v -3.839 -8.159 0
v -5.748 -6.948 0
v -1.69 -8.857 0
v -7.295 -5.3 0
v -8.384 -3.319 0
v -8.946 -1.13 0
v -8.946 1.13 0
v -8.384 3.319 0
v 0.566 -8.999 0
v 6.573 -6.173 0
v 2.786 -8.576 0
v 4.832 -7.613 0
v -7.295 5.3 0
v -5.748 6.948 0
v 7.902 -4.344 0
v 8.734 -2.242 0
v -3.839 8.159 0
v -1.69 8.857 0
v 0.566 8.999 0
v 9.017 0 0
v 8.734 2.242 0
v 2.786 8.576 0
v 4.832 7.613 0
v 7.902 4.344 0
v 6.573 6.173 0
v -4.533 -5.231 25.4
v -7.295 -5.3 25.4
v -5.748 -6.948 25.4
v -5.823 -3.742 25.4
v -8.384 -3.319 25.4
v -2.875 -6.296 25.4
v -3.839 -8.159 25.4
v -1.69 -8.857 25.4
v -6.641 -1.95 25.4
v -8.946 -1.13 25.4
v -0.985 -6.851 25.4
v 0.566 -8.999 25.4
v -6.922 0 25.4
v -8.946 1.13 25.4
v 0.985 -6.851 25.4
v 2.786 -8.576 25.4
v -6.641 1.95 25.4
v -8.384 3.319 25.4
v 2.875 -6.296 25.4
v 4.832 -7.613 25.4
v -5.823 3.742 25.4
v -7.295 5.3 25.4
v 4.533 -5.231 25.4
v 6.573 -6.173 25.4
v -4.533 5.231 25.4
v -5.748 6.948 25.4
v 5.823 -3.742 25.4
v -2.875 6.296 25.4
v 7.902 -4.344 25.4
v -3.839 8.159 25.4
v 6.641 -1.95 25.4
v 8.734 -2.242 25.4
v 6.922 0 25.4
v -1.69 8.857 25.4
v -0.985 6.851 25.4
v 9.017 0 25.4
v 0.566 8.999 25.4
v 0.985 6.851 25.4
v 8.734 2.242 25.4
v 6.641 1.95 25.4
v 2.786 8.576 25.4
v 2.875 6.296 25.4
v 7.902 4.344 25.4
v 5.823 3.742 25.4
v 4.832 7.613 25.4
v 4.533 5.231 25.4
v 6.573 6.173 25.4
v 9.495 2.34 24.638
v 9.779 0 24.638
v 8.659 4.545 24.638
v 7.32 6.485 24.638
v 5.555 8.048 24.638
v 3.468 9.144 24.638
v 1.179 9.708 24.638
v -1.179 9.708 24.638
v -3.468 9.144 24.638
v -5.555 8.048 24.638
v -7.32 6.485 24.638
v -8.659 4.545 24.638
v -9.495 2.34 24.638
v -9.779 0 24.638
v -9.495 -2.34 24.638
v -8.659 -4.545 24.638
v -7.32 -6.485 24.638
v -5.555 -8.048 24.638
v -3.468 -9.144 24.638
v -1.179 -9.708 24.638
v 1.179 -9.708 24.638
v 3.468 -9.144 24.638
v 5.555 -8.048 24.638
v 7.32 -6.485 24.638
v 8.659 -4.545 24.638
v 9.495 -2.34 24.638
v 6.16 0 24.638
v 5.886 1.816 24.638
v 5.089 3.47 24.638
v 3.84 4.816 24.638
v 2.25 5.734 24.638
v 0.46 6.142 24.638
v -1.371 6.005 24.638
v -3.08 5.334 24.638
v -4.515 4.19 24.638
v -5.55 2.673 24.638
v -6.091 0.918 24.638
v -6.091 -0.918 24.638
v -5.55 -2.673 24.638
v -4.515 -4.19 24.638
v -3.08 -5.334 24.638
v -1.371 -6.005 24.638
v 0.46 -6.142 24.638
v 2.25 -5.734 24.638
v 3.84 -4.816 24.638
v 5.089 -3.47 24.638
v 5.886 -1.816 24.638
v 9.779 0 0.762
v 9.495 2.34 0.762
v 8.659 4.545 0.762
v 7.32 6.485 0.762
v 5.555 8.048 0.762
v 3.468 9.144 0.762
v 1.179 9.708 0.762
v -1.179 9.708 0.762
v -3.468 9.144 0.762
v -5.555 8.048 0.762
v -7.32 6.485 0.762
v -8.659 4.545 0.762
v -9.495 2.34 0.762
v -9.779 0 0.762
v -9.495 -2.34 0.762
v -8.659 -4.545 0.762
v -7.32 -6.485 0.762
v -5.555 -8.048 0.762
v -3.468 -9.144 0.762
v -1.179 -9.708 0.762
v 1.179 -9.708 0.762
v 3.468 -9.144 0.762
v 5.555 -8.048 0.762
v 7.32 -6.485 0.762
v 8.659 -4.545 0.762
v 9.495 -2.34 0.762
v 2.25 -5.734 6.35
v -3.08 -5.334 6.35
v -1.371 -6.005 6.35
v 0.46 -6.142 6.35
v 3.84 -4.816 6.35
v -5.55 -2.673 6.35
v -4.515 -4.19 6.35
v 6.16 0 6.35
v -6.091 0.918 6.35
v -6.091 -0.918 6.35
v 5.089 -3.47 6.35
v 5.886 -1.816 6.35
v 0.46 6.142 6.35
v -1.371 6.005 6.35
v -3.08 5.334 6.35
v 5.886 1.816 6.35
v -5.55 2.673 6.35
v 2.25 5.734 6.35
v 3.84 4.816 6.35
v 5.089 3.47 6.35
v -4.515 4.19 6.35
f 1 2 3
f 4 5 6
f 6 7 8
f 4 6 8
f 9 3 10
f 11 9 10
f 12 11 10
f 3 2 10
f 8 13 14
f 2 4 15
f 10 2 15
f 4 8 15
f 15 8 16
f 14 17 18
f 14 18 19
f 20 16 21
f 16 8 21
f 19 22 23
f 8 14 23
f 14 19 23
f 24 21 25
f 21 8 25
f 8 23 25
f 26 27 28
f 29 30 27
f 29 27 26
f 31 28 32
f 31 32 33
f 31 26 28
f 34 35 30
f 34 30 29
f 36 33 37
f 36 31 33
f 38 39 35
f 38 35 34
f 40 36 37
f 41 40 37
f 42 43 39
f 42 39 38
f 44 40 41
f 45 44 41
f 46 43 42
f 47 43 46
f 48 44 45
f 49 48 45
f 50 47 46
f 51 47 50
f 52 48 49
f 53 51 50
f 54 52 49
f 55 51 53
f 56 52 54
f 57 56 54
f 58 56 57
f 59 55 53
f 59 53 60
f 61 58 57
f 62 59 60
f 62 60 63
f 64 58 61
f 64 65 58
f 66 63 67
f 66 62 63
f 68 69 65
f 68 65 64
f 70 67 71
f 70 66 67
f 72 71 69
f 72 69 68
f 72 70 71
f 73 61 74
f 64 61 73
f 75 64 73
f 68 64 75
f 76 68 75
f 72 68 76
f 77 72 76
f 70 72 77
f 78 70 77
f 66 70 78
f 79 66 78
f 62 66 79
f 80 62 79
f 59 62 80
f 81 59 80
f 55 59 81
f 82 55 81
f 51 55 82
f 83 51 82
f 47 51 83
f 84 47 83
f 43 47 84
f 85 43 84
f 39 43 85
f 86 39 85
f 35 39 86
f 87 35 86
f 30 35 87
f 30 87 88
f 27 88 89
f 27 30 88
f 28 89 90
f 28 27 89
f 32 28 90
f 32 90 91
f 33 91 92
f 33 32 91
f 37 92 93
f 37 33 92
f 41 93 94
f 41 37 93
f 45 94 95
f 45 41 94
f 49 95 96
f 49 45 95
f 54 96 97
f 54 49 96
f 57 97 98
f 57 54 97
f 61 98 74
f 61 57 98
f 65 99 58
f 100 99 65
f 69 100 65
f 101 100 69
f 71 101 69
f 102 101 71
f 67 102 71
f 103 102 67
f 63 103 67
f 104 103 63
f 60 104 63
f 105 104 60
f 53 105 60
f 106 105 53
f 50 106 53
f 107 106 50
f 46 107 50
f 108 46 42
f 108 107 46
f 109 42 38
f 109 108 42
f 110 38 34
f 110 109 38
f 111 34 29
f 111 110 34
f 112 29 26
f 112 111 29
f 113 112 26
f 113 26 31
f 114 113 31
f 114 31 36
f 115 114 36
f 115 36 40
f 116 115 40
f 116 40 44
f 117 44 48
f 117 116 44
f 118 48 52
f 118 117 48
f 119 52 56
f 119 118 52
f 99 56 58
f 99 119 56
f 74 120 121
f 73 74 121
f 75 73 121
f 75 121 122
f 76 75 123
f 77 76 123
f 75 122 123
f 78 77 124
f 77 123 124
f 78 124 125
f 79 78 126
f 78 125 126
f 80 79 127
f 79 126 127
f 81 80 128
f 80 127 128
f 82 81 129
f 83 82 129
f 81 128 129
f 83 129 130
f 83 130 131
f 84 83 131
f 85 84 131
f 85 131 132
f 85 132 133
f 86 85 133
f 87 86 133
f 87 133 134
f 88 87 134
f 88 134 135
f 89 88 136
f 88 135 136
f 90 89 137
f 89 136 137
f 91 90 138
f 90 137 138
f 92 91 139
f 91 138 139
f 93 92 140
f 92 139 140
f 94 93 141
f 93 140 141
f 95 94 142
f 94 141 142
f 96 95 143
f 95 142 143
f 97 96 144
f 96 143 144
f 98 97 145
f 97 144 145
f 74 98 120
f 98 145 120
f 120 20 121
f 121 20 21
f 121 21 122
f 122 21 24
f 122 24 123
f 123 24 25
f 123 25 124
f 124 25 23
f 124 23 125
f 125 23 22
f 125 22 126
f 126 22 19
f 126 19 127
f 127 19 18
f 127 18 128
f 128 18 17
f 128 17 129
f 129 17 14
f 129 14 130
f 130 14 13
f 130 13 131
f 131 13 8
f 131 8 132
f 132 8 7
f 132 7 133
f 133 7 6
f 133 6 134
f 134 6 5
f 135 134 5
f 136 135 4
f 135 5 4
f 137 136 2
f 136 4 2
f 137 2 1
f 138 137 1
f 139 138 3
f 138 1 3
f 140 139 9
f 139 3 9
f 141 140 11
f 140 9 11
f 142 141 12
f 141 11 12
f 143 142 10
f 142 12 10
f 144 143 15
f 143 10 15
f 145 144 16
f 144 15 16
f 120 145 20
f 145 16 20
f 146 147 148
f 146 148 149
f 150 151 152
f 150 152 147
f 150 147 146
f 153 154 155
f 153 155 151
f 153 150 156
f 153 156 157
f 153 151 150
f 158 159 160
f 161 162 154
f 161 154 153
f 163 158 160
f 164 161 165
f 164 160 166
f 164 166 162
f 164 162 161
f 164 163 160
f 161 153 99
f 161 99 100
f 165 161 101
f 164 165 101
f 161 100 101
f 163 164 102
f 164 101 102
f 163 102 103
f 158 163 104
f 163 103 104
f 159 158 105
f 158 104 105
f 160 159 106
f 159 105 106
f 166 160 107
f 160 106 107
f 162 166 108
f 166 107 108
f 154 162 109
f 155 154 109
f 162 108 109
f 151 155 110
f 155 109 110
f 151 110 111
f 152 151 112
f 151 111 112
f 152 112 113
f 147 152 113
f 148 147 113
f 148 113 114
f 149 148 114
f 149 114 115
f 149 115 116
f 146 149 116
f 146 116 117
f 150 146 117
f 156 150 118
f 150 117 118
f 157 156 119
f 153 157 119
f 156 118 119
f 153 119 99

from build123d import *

# Parameters (mm, degrees)
F0_R     = 9.779
F1_DEPTH = 25.4
F2_SIZE  = 0.762
F3_R     = 6.1595
F4_DEPTH = 19.05
F5_SIZE  = 0.762


with BuildPart() as f1:
    # F0 (on Top) → F1 (new body)
    with BuildSketch(Plane.XY):
        Circle(F0_R)
    extrude(amount=F1_DEPTH)

    # F2
    f2_edges = [f1.edges().sort_by_distance(p)[0] for p in [
        (-9.779, 0, 0),
    ]]
    chamfer(f2_edges, length=F2_SIZE)

    # F3 (on face) → F4 (cut)
    with BuildSketch(Plane.XY.offset(25.4)):
        Circle(F3_R)
    extrude(amount=-F4_DEPTH, mode=Mode.SUBTRACT)

    # F5
    f5_edges = [f1.edges().sort_by_distance(p)[0] for p in [
        (-9.779, 0, 25.4),
        (-6.1595, 0, 25.4),
    ]]
    chamfer(f5_edges, length=F5_SIZE)


solid = f1.part
